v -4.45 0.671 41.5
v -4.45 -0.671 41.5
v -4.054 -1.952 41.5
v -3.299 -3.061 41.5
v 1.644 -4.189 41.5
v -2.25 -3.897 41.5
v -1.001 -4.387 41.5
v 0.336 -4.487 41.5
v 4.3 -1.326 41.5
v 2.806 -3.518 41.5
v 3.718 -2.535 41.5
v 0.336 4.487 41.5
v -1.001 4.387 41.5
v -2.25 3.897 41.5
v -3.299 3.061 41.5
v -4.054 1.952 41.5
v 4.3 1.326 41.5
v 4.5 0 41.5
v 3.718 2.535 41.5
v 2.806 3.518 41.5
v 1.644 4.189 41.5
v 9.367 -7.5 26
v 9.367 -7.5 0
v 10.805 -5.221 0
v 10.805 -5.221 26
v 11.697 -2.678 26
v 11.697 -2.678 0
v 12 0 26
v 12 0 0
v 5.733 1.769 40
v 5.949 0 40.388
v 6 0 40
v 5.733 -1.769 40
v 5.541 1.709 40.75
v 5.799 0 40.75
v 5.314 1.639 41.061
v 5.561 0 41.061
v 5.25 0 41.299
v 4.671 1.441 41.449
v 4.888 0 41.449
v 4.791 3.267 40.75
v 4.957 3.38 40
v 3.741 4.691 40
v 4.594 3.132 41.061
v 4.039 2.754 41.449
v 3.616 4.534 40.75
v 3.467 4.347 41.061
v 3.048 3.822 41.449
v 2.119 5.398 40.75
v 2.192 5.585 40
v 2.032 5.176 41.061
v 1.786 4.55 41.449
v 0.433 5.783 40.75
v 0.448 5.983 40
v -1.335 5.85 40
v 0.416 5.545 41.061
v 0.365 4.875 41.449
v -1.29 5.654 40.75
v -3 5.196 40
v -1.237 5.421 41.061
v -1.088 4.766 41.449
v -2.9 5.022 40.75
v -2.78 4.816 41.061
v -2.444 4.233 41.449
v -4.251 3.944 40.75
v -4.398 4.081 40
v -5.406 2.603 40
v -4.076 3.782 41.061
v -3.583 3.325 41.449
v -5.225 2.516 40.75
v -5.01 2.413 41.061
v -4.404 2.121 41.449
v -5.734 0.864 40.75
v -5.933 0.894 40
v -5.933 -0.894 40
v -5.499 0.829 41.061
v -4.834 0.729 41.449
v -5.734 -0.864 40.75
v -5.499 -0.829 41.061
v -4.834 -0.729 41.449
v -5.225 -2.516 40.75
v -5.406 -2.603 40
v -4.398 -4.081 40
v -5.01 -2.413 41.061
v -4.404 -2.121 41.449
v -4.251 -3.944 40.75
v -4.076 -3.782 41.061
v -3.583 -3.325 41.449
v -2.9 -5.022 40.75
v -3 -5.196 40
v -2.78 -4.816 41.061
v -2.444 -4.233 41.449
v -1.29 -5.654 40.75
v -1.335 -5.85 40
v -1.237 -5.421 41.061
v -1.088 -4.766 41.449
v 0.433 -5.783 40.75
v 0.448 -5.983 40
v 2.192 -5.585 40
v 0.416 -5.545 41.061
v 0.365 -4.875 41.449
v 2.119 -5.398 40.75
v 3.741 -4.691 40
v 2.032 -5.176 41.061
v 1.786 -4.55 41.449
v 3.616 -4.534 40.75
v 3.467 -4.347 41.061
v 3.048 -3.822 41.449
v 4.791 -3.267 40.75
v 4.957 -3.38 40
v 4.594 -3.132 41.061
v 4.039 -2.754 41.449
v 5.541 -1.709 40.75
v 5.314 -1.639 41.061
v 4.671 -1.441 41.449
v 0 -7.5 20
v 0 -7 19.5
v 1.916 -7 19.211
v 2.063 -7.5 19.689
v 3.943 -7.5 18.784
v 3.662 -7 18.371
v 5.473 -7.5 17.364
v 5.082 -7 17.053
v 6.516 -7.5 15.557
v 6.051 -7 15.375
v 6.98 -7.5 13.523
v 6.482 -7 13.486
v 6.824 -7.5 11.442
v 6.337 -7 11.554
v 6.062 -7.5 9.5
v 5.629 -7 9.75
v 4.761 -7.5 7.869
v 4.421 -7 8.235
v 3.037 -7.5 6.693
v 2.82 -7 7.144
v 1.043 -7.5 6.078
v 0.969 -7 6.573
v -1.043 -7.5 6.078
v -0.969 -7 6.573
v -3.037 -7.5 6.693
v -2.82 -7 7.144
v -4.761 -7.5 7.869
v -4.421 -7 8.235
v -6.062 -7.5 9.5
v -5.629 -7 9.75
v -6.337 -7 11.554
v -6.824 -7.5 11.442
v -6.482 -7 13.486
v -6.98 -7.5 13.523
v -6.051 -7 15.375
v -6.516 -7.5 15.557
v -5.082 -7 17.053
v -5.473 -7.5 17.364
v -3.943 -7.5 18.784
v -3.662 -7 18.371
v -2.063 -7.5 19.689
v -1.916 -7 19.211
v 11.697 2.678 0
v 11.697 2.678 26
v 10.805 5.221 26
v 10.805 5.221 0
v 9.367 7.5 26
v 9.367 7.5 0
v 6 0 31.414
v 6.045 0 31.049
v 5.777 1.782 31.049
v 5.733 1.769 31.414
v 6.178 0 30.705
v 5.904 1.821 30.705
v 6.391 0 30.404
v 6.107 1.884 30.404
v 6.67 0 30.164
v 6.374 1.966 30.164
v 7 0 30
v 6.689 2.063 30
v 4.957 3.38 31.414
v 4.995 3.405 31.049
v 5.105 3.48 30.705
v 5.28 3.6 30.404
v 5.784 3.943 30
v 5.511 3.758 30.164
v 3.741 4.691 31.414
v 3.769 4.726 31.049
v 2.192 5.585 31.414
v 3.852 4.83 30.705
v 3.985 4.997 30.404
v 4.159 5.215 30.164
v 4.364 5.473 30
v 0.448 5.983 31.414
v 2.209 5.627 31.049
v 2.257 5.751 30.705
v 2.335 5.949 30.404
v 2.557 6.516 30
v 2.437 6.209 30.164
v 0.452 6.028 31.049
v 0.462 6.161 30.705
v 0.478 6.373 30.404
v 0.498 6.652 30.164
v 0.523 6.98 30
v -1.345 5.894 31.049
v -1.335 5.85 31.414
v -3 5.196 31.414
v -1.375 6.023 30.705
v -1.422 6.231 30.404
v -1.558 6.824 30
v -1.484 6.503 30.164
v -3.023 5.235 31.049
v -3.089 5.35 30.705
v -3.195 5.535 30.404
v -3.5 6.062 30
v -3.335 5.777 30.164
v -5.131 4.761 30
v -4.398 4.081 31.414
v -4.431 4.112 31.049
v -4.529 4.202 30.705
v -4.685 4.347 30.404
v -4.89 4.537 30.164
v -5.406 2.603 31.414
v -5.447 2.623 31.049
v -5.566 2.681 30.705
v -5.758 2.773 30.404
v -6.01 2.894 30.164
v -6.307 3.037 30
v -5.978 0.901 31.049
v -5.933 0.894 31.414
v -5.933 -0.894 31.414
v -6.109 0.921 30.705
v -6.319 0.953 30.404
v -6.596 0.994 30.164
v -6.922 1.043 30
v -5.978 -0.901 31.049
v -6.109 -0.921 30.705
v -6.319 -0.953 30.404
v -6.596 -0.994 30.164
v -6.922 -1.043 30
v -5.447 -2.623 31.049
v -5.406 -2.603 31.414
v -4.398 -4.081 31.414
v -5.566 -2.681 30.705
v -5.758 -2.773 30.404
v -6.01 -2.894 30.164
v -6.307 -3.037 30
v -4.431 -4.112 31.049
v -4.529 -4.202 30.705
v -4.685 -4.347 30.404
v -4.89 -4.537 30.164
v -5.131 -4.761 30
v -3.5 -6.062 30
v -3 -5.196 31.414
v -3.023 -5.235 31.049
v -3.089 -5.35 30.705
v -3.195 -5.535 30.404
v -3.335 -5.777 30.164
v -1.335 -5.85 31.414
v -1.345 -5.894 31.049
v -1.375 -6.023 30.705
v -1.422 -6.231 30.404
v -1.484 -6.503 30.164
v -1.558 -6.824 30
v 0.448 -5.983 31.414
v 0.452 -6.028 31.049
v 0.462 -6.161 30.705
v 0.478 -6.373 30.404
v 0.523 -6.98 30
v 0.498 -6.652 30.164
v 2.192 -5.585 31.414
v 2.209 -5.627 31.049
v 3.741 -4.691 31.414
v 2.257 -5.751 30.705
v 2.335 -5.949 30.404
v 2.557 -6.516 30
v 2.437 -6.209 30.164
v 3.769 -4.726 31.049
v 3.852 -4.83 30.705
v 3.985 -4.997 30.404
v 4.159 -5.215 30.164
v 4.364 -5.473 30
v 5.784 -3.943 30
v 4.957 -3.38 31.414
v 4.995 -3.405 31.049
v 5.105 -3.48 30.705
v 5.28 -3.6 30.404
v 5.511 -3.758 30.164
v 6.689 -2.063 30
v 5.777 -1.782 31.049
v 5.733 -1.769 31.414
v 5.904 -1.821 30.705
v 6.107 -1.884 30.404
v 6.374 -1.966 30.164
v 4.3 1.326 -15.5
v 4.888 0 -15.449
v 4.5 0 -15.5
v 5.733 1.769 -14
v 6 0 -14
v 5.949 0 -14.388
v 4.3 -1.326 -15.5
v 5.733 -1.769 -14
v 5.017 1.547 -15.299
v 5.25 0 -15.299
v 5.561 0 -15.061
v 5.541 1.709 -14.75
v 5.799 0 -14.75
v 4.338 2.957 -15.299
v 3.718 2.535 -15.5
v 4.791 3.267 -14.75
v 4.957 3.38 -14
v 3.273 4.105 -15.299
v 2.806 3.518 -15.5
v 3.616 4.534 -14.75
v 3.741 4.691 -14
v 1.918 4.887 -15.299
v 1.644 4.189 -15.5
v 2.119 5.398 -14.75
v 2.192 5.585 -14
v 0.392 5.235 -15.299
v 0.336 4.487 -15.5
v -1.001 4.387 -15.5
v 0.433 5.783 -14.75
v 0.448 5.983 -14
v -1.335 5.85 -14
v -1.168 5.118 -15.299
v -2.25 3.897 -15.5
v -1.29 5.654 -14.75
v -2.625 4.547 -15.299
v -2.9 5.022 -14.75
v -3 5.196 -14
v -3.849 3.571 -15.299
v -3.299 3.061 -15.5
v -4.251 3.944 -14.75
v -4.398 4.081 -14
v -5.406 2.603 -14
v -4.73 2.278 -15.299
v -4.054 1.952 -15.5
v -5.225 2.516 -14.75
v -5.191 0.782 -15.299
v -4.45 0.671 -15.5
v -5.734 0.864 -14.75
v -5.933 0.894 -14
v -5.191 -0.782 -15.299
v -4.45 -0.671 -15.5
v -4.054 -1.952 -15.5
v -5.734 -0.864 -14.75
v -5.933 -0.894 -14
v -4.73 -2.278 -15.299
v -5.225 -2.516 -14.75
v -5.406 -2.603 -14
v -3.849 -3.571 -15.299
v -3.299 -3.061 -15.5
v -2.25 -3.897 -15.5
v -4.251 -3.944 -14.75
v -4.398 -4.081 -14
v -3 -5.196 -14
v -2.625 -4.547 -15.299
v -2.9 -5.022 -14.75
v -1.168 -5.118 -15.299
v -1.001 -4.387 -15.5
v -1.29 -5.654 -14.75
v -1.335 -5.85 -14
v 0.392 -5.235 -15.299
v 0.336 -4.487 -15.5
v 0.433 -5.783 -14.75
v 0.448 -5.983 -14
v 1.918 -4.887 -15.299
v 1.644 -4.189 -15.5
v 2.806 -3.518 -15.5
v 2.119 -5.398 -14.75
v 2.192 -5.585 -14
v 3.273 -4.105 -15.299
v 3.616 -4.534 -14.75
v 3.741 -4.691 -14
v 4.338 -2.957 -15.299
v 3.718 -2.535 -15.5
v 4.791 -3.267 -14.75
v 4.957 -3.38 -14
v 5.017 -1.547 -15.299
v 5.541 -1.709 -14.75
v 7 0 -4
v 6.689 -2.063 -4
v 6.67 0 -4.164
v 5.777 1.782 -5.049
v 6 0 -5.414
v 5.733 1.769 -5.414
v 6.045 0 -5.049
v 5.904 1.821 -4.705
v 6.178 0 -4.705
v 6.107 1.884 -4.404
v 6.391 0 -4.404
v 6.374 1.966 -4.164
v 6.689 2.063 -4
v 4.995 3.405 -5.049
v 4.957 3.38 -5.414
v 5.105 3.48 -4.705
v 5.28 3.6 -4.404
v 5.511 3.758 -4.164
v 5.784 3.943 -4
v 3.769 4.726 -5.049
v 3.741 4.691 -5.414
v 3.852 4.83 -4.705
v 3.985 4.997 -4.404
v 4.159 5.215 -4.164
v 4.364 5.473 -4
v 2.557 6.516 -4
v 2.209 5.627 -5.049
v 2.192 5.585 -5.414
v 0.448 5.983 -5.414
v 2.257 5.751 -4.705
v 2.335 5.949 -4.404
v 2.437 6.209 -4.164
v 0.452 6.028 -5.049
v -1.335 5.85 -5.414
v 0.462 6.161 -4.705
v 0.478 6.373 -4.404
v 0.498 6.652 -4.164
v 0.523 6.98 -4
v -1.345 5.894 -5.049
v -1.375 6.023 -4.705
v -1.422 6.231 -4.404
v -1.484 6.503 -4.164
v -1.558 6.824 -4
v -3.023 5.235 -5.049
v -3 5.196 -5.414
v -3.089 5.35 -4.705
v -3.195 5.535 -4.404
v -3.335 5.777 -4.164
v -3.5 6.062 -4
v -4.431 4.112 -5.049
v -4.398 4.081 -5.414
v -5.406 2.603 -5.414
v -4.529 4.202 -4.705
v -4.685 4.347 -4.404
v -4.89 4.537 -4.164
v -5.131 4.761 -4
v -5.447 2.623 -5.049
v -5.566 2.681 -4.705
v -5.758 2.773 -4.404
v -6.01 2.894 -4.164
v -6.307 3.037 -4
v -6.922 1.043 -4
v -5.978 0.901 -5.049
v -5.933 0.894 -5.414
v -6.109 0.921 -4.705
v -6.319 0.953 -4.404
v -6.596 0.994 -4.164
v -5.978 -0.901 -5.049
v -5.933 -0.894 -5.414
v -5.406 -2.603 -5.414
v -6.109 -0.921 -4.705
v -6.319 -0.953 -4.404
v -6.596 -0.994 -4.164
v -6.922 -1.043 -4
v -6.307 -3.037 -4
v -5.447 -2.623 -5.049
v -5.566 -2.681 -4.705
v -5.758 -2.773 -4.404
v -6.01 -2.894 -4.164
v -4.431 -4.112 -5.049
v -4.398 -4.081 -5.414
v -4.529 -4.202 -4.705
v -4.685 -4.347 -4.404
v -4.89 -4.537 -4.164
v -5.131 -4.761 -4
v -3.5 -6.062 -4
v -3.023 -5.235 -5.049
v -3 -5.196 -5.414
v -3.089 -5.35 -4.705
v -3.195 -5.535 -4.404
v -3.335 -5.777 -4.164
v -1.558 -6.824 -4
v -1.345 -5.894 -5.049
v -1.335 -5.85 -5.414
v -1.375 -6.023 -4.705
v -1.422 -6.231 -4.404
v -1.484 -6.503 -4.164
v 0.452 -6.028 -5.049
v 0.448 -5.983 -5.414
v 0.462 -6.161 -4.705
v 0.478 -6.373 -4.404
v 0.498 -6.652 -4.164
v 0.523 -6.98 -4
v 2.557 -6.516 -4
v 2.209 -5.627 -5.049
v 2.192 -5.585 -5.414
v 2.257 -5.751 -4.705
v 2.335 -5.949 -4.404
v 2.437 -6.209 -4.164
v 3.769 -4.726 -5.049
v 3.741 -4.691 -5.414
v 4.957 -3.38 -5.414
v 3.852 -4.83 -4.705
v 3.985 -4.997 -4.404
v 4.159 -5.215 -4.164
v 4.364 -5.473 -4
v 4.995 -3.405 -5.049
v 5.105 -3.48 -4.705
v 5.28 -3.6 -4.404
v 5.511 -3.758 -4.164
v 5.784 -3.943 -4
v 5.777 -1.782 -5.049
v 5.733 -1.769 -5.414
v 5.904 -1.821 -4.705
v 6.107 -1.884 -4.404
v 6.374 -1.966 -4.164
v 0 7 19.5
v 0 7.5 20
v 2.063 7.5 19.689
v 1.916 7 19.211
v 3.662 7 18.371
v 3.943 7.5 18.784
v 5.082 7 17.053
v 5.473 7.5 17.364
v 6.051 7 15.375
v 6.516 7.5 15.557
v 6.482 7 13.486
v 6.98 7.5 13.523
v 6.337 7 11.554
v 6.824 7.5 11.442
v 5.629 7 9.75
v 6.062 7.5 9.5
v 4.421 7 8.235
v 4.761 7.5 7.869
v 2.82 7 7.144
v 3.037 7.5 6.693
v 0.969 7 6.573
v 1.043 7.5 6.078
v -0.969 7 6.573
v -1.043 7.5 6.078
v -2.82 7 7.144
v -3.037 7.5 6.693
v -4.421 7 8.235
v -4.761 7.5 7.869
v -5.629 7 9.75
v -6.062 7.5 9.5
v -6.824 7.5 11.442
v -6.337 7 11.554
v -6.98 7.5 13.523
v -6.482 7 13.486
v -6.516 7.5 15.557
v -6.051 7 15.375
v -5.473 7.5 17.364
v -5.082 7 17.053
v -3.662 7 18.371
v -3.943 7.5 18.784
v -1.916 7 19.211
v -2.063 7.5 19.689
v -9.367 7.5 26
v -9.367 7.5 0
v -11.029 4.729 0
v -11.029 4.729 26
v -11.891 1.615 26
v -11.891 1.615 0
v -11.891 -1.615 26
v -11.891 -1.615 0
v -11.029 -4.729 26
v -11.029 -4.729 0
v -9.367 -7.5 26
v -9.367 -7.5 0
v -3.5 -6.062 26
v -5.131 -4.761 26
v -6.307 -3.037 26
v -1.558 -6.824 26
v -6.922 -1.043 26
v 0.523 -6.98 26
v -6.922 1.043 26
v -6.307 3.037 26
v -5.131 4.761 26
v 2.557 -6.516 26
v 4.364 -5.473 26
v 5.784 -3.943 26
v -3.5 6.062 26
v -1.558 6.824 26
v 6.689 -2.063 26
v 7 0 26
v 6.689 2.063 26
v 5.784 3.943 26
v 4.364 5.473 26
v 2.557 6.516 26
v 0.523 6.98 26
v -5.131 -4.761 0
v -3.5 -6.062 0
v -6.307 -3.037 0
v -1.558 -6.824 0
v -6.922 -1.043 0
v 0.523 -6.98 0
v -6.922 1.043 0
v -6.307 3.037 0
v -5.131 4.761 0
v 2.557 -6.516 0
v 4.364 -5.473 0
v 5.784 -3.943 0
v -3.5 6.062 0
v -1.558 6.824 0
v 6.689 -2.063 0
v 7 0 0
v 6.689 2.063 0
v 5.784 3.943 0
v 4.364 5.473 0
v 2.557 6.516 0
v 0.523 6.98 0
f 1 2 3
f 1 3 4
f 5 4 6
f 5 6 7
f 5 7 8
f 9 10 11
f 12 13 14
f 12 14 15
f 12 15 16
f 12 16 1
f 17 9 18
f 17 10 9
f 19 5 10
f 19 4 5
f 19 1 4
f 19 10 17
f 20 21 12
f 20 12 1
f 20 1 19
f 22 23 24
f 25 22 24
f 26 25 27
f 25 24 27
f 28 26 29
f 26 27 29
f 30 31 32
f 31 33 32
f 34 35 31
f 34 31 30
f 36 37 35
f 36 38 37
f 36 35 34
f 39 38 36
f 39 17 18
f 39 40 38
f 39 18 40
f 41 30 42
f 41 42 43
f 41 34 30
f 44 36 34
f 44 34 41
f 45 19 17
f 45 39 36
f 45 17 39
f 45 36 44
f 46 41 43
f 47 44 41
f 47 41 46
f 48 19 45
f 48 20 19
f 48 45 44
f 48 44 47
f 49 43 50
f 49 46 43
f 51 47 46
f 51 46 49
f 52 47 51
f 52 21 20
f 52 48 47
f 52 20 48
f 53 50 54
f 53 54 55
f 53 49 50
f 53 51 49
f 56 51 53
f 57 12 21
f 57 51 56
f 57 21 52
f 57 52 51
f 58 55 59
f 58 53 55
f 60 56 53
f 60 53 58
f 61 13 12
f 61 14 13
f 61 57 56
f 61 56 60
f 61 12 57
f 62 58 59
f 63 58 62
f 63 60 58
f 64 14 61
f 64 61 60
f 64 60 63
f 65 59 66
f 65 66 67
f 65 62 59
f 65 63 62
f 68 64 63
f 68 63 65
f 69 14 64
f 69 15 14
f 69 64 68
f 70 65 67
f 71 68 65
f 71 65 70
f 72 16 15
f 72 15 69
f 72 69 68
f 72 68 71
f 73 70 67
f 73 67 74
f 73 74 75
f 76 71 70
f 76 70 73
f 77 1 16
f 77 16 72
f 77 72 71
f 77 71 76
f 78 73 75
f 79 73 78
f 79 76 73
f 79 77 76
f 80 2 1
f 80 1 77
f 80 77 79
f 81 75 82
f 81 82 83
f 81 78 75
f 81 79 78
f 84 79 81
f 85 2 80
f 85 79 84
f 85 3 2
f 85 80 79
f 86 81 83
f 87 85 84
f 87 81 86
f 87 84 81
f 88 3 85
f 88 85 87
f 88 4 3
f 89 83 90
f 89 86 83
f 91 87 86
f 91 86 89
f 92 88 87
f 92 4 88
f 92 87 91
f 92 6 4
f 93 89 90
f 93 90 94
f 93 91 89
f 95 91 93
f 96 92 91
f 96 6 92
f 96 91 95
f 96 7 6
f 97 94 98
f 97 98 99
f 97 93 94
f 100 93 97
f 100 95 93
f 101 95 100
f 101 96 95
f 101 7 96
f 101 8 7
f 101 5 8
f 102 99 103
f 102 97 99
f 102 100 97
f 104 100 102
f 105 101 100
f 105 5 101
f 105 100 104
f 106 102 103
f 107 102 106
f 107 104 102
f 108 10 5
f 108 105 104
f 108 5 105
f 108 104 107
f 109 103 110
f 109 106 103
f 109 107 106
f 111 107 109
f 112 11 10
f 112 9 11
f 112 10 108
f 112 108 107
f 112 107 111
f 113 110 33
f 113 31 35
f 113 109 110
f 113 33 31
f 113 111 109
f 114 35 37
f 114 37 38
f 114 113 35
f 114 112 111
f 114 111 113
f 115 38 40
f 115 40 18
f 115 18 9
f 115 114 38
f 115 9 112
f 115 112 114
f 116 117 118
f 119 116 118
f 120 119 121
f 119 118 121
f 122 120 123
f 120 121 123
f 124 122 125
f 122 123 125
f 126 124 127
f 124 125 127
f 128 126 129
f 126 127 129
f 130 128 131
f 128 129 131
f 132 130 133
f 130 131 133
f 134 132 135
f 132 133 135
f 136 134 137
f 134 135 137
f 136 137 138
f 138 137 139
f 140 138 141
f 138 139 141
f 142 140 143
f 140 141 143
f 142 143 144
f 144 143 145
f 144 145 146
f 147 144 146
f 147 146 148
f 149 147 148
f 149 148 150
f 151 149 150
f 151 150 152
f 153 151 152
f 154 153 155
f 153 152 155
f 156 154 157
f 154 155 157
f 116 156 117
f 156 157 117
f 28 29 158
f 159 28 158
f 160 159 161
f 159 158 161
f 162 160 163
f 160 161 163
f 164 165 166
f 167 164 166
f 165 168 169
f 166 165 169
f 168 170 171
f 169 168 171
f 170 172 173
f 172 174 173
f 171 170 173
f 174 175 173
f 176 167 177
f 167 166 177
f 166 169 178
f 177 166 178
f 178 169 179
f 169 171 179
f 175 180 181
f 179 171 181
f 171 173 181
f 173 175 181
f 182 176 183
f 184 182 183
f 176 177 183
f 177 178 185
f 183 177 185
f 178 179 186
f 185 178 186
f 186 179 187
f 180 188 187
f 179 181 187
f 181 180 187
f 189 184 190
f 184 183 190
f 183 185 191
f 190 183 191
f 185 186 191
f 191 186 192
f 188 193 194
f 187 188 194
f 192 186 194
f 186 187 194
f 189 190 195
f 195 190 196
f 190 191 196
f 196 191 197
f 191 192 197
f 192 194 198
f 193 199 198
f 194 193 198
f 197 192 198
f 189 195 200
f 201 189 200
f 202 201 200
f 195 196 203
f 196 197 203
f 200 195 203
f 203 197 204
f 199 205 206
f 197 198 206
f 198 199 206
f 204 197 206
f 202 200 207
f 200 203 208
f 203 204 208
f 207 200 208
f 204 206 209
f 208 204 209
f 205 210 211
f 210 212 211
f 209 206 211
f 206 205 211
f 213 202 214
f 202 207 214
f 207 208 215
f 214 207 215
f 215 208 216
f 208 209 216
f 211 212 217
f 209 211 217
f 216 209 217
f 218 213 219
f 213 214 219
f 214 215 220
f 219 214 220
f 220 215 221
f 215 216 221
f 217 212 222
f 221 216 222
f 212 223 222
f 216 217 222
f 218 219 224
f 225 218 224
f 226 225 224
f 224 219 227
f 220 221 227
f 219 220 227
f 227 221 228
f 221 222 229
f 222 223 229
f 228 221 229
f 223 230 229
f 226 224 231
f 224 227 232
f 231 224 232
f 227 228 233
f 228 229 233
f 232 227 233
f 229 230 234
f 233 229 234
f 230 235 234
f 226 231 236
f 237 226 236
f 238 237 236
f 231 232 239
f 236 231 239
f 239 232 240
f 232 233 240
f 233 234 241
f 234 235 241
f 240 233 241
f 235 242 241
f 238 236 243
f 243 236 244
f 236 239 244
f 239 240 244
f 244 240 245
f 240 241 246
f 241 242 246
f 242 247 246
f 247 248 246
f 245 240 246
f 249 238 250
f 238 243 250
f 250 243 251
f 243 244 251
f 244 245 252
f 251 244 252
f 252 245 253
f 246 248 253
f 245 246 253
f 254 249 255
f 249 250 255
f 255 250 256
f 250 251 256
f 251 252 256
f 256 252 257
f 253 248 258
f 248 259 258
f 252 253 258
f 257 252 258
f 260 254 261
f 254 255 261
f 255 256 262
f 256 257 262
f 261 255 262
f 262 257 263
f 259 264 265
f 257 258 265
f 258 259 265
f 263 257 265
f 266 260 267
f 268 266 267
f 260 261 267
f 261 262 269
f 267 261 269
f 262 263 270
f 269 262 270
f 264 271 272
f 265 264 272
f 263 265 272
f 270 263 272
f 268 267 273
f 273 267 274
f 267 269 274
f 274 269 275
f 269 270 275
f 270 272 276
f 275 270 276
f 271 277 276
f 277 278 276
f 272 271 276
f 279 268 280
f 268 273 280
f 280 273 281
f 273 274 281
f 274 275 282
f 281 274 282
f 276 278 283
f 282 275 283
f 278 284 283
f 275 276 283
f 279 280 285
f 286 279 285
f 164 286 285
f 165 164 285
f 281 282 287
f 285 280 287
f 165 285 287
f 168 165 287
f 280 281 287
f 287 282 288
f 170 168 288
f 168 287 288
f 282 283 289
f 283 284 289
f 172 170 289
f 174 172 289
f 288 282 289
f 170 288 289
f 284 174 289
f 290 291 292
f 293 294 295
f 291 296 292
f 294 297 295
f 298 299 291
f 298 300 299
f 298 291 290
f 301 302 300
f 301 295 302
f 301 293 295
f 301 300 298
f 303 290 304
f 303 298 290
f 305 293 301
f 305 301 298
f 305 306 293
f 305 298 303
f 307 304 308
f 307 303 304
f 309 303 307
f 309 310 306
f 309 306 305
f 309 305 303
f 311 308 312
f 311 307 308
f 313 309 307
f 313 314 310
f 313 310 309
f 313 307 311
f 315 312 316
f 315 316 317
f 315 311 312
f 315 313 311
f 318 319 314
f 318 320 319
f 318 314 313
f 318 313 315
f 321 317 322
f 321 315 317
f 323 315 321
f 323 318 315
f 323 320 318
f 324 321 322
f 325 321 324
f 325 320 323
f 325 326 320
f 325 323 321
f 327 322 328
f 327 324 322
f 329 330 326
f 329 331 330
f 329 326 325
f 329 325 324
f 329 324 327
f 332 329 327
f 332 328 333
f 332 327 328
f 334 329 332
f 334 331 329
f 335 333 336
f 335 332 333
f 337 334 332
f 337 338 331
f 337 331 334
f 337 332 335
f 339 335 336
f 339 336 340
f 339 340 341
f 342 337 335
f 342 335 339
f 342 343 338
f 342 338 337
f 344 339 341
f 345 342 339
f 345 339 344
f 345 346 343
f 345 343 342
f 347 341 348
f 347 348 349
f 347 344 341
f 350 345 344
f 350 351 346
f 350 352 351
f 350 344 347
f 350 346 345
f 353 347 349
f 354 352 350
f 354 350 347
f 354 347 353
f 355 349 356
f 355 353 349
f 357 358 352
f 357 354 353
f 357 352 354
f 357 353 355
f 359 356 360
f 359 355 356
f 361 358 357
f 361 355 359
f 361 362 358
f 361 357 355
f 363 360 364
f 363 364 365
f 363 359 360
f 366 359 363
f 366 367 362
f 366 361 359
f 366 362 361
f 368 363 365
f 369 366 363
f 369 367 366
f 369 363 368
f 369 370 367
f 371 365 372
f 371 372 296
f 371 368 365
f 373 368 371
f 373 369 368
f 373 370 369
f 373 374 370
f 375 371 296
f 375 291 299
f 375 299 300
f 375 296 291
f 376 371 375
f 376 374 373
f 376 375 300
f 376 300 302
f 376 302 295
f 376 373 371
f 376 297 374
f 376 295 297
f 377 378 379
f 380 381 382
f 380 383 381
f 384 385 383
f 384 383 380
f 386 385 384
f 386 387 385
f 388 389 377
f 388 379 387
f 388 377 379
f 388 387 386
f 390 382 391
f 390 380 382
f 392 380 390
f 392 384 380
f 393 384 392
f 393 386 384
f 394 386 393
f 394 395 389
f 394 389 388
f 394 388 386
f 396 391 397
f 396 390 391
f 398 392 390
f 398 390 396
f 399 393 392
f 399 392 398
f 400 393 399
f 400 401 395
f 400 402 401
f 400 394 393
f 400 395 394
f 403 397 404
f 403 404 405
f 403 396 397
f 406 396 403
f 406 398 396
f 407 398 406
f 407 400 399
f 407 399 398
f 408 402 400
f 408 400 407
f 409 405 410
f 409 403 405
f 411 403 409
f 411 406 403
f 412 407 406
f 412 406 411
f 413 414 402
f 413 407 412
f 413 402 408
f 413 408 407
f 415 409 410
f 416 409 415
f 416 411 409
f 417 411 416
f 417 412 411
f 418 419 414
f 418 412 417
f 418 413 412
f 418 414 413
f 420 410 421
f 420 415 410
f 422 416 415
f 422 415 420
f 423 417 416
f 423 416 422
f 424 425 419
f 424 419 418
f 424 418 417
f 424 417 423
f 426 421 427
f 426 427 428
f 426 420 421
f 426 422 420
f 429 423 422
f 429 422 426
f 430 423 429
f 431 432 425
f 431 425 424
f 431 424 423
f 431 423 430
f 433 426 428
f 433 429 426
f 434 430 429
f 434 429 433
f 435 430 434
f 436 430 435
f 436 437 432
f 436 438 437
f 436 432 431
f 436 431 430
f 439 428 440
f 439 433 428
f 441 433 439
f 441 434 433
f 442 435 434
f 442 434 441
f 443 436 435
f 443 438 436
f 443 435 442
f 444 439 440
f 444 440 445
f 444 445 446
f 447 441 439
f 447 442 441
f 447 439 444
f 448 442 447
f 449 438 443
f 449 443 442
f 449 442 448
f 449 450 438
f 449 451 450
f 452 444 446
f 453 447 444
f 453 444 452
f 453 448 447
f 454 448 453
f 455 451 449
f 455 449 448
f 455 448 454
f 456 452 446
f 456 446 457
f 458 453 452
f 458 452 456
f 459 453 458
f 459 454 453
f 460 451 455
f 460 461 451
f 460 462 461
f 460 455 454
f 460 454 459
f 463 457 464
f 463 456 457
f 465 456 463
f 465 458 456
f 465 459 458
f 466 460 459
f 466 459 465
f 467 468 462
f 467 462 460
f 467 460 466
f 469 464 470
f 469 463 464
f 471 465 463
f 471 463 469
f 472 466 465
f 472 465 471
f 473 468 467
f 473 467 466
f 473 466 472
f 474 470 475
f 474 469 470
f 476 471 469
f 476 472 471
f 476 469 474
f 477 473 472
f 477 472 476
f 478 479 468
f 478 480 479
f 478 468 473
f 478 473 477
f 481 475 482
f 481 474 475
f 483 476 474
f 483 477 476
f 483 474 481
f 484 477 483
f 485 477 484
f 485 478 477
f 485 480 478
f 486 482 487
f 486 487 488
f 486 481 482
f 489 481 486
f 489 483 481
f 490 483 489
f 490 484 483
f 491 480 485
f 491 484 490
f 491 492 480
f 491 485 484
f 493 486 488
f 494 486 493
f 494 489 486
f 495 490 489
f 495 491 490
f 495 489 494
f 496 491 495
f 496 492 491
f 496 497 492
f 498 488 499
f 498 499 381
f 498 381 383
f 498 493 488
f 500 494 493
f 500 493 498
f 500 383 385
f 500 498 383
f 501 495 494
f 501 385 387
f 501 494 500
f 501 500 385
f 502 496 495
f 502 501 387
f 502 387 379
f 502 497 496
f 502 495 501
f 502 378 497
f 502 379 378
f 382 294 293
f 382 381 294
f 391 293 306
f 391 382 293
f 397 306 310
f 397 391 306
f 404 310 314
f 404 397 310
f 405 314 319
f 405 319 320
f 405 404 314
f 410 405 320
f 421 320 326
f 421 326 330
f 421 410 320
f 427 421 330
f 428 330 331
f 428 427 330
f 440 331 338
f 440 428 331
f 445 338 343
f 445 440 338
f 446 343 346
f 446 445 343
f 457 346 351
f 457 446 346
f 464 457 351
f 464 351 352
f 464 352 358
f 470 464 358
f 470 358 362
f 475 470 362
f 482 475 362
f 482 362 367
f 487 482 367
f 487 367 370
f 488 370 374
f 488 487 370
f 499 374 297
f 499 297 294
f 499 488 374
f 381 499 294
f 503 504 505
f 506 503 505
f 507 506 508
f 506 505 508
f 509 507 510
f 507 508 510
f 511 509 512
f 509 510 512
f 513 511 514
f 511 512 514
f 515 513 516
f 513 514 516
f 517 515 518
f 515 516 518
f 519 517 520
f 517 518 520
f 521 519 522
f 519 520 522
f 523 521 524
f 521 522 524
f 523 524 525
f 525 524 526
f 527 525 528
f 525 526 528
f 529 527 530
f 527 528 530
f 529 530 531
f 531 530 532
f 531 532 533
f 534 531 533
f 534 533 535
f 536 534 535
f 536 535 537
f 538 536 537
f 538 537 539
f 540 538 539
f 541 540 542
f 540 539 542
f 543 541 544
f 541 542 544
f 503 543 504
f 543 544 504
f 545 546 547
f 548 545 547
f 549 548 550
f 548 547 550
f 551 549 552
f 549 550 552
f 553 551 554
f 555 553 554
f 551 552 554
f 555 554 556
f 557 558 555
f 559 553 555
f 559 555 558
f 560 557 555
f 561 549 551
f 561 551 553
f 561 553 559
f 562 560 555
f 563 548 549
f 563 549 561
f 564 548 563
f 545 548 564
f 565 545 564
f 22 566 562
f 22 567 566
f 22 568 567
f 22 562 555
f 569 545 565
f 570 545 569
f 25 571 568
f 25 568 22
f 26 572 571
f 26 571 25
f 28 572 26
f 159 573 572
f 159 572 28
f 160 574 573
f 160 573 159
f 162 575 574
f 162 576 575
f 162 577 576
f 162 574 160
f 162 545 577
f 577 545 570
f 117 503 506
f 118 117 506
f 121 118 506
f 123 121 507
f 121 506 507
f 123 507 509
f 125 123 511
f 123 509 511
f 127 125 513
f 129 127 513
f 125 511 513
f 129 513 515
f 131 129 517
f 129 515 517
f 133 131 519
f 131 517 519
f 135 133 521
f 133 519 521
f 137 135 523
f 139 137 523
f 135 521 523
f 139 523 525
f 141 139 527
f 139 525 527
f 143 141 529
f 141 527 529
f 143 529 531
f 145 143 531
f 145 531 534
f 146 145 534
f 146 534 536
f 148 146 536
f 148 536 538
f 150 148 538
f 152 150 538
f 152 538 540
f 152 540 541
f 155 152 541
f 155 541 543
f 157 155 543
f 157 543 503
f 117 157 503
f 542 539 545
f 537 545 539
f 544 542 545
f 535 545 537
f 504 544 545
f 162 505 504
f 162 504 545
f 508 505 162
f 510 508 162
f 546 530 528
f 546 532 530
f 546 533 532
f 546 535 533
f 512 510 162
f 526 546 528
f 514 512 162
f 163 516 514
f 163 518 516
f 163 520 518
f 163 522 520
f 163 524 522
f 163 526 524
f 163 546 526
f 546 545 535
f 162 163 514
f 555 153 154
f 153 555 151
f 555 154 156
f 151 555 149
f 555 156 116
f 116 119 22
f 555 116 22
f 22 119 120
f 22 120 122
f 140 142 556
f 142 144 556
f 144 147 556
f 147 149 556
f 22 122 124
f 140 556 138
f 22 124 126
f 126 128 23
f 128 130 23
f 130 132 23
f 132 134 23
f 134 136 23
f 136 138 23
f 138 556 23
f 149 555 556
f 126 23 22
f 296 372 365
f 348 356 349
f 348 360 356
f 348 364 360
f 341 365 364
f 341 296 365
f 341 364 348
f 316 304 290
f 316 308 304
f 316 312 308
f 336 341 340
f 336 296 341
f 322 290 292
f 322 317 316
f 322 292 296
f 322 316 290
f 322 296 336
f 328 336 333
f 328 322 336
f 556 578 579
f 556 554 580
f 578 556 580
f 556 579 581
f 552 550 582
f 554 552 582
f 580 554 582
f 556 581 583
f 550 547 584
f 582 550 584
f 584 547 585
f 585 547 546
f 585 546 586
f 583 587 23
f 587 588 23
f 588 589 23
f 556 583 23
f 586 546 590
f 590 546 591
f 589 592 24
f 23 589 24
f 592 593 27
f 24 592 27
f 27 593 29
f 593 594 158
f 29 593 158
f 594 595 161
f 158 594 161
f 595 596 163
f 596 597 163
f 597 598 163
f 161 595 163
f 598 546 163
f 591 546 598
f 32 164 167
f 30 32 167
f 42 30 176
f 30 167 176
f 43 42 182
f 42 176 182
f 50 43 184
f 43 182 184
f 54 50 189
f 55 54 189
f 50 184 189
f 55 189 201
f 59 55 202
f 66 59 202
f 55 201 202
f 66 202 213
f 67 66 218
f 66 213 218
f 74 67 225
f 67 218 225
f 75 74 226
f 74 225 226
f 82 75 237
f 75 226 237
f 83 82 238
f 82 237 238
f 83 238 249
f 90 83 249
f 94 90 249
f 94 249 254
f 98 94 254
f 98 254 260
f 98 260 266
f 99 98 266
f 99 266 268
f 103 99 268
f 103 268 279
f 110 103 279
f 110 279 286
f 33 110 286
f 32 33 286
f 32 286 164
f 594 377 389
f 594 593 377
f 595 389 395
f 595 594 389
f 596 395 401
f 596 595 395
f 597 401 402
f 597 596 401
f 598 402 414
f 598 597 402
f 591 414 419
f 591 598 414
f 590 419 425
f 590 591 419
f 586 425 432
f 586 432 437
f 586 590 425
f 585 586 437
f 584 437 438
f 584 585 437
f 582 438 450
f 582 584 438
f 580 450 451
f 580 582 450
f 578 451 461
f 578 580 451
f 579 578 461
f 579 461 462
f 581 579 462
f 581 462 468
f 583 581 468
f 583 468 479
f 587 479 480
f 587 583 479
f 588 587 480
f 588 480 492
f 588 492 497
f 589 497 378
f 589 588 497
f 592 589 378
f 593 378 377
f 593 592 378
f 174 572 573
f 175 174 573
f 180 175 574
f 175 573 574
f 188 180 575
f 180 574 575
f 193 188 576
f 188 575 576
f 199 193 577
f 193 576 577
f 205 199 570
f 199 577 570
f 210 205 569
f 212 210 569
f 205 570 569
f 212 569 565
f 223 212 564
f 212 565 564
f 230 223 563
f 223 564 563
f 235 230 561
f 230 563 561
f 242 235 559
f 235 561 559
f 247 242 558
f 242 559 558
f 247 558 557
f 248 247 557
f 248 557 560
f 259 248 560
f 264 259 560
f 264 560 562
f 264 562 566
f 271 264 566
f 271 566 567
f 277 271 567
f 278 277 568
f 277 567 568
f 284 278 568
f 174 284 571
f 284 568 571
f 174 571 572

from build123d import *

# Parameters (mm, degrees)
SKETCH1_W           = 18.734993996
SKETCH1_H           = 15
BOSS_EXTRUDE1_DEPTH = 26
SKETCH2_R           = 6.5
CUT_EXTRUDE1_DEPTH  = 33.32645975
CHAMFER1_SIZE       = 0.5
SKETCH3_R           = 7
BOSS_EXTRUDE2_DEPTH = 4
SKETCH4_R           = 6
BOSS_EXTRUDE3_DEPTH = 11.5
FILLET1_R           = 1.5


with BuildPart() as part:
    # Sketch1 → Boss-Extrude1 (new body)
    with BuildSketch(Plane.XY):
        Rectangle(SKETCH1_W, SKETCH1_H)
        with BuildLine():
            ThreePointArc((-9.367496998, 7.5), (-12, 0), (-9.367496998, -7.5))
            Line((-9.367496998, -7.5), (-9.367496998, 7.5))
        make_face()
        with BuildLine():
            Line((9.367496998, 7.5), (9.367496998, -7.5))
            ThreePointArc((9.367496998, -7.5), (11.322763885, -3.974294656), (12, 0))
            ThreePointArc((12, 0), (11.322763885, 3.974294656), (9.367496998, 7.5))
        make_face()
    extrude(amount=BOSS_EXTRUDE1_DEPTH)

    # Sketch2 → Cut-Extrude1 (cut, through all)
    with BuildSketch(Plane(origin=(0, 7.5, 0), x_dir=(1, 0, 0), z_dir=(0, 1, 0))):
        with Locations(Location((0, -13, 0), (0, 0, 270))):
            Circle(SKETCH2_R)
    extrude(amount=-CUT_EXTRUDE1_DEPTH, mode=Mode.SUBTRACT)

    # Chamfer1
    chamfer1_edges = [part.edges().sort_by_distance(p)[0] for p in [
        (0, -7.5, 6.5),
        (0, 7.5, 6.5),
    ]]
    chamfer(chamfer1_edges, length=CHAMFER1_SIZE)

    # Sketch3 → Boss-Extrude2 (add)
    with BuildSketch(Plane.XY.offset(26)):
        Circle(SKETCH3_R)
    extrude(amount=BOSS_EXTRUDE2_DEPTH)

    # Sketch4 → Boss-Extrude3 (add)
    with BuildSketch(Plane.XY.offset(30)):
        Circle(SKETCH4_R)
    extrude(amount=BOSS_EXTRUDE3_DEPTH)

    # Fillet1
    # the kernel refuses this fillet: 1.5 mm, written as the material it adds along each edge
    with BuildSketch(Plane(origin=(0, 0, 30), x_dir=(1, 0, 0), z_dir=(0, -1, 0))) as fillet1_piece_1:
        with BuildLine():
            CenterArc((7.5, 1.414213562), FILLET1_R, 180, 70.528779366)
            Line((6, 1.414213562), (6, 0))
            Line((6, 0), (7, 0))
        make_face()
    revolve(axis=Axis((0, 0, 30), (0, 0, 1)))
    # the kernel refuses this fillet: 1.5 mm, written as the material it takes off along each edge
    with BuildSketch(Plane(origin=(0, 0, 41.5), x_dir=(1, 0, 0), z_dir=(0, -1, 0))) as fillet1_2_piece_1:
        with BuildLine():
            CenterArc((6 - FILLET1_R, -FILLET1_R), FILLET1_R, 0, 90)
            Line((6 - FILLET1_R, 0), (6, 0))
            Line((6, 0), (6, -FILLET1_R))
        make_face()
    revolve(axis=Axis((0, 0, 41.5), (0, 0, 1)), mode=Mode.SUBTRACT)

    # Mirror1: read off the stored shape, not the designer's step
    # Mirror1 outline → Mirror1 (revolve)
    with BuildSketch(Plane.XZ):
        with BuildLine():
            ThreePointArc((6, -5.414213562), (6.275255129, -4.548188159), (7, -4))
            Line((7, -4), (7, 0))
            Line((7, 0), (0, 0))
            Line((0, 0), (0, -15.5))
            Line((0, -15.5), (4.5, -15.5))
            ThreePointArc((4.5, -15.5), (5.560660172, -15.060660172), (6, -14))
            Line((6, -14), (6, -5.414213562))
        make_face()
    revolve(axis=Axis((0, 0, 0), (0, 0, 1)))


solid = part.part
